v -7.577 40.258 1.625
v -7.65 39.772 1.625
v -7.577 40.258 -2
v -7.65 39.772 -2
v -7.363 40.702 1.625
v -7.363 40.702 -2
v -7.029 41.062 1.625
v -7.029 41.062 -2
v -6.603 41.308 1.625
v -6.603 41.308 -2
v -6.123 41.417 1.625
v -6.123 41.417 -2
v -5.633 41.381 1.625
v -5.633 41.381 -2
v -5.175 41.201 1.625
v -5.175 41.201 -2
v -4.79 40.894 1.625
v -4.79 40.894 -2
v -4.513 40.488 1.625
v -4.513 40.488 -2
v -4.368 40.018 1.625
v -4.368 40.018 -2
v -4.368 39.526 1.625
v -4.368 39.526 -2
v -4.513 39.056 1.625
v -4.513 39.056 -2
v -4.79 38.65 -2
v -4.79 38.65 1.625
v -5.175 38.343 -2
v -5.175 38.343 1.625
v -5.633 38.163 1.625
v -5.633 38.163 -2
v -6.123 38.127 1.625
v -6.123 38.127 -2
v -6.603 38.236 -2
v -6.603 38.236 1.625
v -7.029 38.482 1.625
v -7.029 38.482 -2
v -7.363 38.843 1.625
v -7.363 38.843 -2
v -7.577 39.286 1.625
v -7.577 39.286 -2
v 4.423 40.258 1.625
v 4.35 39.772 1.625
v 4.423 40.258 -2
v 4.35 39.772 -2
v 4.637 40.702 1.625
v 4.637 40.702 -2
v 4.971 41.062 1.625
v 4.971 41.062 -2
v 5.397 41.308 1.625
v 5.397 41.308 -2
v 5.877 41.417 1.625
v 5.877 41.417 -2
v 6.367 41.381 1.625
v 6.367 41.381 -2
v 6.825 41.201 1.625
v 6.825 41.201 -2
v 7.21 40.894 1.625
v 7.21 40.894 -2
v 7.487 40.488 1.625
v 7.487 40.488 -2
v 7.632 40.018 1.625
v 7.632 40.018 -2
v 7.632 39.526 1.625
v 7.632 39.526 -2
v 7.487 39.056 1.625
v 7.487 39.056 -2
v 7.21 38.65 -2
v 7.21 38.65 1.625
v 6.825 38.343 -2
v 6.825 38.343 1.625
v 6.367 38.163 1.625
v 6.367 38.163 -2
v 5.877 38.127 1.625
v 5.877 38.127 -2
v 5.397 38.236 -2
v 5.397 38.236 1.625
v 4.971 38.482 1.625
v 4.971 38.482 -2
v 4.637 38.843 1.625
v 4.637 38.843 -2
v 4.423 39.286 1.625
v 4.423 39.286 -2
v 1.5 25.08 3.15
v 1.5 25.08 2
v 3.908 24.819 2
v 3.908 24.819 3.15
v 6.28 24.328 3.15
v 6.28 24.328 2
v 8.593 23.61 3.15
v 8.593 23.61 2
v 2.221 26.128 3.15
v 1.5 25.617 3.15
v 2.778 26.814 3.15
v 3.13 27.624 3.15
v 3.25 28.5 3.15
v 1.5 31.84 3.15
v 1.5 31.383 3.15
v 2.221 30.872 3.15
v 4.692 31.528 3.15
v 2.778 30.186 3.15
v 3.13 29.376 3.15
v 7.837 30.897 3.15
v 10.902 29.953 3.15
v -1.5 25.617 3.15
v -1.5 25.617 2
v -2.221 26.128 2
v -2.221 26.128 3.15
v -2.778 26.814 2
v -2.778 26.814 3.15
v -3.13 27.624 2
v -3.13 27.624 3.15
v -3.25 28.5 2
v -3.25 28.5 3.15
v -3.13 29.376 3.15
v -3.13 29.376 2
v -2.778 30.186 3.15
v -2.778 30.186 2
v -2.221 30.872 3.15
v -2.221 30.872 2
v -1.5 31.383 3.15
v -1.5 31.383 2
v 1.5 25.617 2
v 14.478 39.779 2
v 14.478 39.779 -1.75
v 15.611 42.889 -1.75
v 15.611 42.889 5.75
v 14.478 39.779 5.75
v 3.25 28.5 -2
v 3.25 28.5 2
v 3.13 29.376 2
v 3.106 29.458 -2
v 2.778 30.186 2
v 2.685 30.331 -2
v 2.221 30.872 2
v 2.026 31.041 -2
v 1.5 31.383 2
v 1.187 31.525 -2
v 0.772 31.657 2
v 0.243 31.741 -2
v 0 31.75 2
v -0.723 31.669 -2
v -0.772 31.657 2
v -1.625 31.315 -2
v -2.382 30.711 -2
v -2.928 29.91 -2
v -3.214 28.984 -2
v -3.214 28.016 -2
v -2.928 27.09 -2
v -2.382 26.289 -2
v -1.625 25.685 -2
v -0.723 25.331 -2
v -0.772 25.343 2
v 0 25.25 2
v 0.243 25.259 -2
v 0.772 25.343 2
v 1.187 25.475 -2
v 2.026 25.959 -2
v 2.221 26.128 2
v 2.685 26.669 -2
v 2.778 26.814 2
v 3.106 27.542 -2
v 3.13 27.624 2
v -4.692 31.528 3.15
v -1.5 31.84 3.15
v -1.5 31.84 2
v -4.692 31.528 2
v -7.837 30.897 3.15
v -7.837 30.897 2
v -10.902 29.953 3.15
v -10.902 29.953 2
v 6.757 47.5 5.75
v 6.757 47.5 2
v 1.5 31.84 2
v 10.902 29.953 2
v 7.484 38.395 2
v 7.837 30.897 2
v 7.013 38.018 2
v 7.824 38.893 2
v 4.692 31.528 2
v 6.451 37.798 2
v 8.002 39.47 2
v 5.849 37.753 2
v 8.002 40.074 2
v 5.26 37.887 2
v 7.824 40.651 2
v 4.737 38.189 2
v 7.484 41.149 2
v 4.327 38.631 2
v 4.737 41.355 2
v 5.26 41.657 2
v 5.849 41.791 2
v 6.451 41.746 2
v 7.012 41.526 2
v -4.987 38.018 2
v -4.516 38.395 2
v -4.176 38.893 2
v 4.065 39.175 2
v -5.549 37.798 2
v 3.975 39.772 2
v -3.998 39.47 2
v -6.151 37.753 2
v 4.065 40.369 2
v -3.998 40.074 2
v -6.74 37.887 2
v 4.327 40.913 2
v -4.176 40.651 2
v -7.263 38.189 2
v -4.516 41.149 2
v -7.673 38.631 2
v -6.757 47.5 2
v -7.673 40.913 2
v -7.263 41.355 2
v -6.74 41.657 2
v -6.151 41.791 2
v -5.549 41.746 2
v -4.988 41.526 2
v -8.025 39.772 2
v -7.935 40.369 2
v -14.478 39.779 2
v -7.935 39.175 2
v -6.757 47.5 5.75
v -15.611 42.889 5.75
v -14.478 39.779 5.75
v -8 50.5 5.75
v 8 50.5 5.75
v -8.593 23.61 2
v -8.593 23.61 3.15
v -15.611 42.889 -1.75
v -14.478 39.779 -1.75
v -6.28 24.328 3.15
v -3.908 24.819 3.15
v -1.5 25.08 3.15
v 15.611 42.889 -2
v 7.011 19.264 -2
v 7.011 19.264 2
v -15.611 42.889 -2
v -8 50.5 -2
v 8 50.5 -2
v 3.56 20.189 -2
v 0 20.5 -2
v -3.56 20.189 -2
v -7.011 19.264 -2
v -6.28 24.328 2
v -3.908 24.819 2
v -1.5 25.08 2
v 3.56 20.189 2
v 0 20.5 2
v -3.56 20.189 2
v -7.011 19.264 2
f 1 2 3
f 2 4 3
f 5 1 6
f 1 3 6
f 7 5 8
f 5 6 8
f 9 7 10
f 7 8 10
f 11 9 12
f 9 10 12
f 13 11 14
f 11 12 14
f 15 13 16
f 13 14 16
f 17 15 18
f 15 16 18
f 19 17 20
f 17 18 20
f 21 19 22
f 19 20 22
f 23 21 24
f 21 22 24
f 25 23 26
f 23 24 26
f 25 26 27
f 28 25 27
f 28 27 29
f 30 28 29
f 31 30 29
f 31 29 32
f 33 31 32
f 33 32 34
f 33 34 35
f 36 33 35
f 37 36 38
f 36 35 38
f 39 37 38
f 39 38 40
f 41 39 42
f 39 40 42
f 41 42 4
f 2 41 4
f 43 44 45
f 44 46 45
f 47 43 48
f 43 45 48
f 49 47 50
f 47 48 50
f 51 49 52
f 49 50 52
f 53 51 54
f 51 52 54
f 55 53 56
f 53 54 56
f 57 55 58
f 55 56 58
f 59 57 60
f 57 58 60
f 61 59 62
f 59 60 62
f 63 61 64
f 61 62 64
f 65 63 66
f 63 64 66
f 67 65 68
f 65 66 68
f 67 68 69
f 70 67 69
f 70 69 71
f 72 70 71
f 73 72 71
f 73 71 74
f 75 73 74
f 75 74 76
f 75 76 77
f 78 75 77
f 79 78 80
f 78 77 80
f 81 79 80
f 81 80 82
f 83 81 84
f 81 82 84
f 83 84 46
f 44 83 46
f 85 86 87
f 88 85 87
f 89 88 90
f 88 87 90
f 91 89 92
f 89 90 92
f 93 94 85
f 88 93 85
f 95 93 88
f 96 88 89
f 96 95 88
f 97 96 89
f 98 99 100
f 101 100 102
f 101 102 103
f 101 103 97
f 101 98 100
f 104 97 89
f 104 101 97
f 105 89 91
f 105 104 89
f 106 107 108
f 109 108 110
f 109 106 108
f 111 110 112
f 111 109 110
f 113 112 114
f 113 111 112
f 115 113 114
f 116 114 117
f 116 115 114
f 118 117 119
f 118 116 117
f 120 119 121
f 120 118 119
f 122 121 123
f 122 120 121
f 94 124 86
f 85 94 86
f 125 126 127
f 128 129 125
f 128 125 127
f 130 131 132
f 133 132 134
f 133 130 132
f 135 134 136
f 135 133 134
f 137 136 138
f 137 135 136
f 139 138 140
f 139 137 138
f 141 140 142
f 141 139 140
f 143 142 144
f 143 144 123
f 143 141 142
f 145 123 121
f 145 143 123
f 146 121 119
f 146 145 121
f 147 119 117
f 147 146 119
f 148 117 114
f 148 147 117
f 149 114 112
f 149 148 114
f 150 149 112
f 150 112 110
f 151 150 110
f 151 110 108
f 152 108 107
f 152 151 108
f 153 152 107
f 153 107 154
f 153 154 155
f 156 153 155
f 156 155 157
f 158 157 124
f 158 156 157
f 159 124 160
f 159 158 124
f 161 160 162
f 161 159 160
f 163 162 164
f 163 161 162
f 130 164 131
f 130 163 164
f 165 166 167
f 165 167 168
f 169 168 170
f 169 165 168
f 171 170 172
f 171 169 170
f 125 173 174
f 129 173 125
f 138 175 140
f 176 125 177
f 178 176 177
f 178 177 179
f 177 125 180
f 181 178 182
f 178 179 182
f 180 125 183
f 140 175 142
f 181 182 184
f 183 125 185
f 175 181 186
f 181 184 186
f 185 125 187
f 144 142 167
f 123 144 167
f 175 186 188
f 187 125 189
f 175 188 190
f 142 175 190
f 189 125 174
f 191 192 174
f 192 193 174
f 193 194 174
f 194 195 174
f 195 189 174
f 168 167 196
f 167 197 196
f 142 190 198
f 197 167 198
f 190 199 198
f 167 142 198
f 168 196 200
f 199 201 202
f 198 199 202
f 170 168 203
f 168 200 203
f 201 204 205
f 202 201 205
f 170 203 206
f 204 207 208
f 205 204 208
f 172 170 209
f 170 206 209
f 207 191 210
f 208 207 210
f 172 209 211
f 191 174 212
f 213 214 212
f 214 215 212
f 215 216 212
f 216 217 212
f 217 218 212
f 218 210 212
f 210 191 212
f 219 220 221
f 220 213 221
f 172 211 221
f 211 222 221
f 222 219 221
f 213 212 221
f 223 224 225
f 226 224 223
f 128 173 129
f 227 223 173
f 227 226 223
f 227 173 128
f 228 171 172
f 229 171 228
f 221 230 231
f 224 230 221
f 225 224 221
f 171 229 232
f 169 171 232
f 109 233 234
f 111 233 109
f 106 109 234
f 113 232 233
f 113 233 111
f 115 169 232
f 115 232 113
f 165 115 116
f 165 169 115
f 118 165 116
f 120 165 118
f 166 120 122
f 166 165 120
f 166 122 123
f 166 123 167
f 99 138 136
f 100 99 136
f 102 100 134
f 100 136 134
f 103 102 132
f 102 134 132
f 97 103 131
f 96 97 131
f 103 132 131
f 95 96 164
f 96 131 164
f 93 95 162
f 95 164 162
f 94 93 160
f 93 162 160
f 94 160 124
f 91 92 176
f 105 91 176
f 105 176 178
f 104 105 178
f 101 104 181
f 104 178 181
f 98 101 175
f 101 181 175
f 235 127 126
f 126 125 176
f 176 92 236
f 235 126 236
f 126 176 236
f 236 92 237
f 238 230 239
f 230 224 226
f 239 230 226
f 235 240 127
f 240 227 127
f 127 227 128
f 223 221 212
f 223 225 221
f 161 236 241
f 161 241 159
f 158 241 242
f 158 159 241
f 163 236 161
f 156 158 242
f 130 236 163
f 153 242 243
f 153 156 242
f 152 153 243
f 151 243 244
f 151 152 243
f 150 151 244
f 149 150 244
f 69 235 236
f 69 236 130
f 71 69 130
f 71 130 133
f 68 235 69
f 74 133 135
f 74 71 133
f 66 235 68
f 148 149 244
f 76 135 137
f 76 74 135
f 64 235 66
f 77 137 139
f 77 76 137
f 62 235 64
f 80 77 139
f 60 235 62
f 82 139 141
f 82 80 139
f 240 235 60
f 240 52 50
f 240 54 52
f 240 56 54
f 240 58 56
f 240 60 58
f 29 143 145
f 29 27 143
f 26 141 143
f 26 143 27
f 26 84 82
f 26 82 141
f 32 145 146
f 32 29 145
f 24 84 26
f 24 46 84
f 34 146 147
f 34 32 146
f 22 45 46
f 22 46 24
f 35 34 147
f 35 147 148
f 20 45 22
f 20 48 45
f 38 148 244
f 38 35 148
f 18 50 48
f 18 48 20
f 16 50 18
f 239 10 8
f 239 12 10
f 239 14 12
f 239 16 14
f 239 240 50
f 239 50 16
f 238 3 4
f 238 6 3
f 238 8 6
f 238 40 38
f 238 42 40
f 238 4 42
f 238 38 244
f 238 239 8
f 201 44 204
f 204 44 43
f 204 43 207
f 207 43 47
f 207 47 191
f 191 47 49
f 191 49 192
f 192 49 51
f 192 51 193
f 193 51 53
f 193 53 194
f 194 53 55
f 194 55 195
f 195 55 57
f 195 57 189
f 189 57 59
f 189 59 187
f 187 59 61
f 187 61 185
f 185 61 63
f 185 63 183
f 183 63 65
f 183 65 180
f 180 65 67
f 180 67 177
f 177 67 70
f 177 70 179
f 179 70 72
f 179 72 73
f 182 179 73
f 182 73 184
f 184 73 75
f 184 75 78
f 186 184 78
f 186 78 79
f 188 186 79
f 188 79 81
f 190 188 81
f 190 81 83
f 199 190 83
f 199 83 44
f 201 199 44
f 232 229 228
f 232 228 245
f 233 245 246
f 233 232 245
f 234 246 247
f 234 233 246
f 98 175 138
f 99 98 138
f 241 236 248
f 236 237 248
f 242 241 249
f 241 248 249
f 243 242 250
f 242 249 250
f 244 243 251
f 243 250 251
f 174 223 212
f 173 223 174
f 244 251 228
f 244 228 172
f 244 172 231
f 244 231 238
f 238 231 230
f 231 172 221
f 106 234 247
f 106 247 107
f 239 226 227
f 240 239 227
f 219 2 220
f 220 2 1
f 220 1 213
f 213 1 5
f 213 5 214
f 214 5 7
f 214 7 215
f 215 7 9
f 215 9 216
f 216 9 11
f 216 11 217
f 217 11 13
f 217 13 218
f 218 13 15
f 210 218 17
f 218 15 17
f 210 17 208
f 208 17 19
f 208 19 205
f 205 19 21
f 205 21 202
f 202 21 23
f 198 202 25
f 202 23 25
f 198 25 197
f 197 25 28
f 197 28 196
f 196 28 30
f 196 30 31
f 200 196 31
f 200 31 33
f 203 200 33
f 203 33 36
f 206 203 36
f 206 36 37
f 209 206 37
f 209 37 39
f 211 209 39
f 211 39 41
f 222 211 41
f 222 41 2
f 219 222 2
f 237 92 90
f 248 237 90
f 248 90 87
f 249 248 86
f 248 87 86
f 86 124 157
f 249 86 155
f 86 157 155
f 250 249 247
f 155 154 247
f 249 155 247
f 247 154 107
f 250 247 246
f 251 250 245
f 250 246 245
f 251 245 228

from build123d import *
from build123d.topology import SkipClean

# Parameters (mm, degrees)
ESQUISSE2_R                 = 3.25
BOSS_EXTRU_3_DEPTH          = 2
BOSS_EXTRU_4_DEPTH          = 3.75
BOSS_EXTRU_5_DEPTH          = 1.15
TROU_TARAUD_M43_D           = 3.3
TROU_TARAUD_M43_CSINK_D     = 4.05
TROU_TARAUD_M43_CSINK_ANGLE = 90


with BuildPart() as part:
    # Esquisse2 → Boss.-Extru.3 (new, symmetric)
    with BuildSketch(Plane.XY):
        with BuildLine():
            Line((-8, 50.5), (8, 50.5))
            Line((8, 50.5), (15.610501, 42.889499))
            Line((15.610501, 42.889499), (7.011413, 19.263699))
            ThreePointArc((7.011413, 19.263699), (0, 20.5), (-7.011413, 19.263699))
            Line((-7.011413, 19.263699), (-15.610501, 42.889499))
            Line((-15.610501, 42.889499), (-8, 50.5))
        make_face()
        with Locations((0, 28.5)):
            Circle(ESQUISSE2_R, mode=Mode.SUBTRACT)
    extrude(amount=BOSS_EXTRU_3_DEPTH, both=True)

    # Esquisse3 → Boss.-Extru.4 (add, symmetric)
    with BuildSketch(Plane.XY.offset(2)):
        Polygon((15.610501, 42.889499), (8, 50.5), (-8, 50.5), (-15.610501, 42.889499), (-14.478369, 39.778991), (-6.757359, 47.5), (6.757359, 47.5), (14.478369, 39.778991), align=None)
    extrude(amount=BOSS_EXTRU_4_DEPTH, both=True)

    # Esquisse4 → Boss.-Extru.5 (add, symmetric)
    with SkipClean():  # the faces are left unmerged after this step: merging them gives an invalid solid
        with BuildSketch(Plane.XY.offset(2)):
            with BuildLine():
                Line((8.593256, 23.609777), (10.901892, 29.952702))
                ThreePointArc((10.901892, 29.952702), (6.272313, 31.251779), (1.5, 31.839686))
                Line((1.5, 31.839686), (1.5, 31.383141))
                ThreePointArc((1.5, 31.383141), (3.25, 28.5), (1.5, 25.616859))
                Line((1.5, 25.616859), (1.5, 25.080184))
                ThreePointArc((1.5, 25.080184), (5.0999, 24.601964), (8.593256, 23.609777))
            make_face()
            with BuildLine():
                Line((-10.901892, 29.952702), (-8.593256, 23.609777))
                ThreePointArc((-8.593256, 23.609777), (-5.0999, 24.601964), (-1.5, 25.080184))
                Line((-1.5, 25.080184), (-1.5, 25.616859))
                ThreePointArc((-1.5, 25.616859), (-3.25, 28.5), (-1.5, 31.383141))
                Line((-1.5, 31.383141), (-1.5, 31.839686))
                ThreePointArc((-1.5, 31.839686), (-6.272313, 31.251779), (-10.901892, 29.952702))
            make_face()
        extrude(amount=BOSS_EXTRU_5_DEPTH, both=True)

    # Trou taraudé M43 (through all)
    with Locations(Plane.XY.offset(2)):
        with Locations((-6, 39.772078), (6, 39.772078)):
            CounterSinkHole(TROU_TARAUD_M43_D / 2, TROU_TARAUD_M43_CSINK_D / 2, counter_sink_angle=TROU_TARAUD_M43_CSINK_ANGLE)


solid = part.part
